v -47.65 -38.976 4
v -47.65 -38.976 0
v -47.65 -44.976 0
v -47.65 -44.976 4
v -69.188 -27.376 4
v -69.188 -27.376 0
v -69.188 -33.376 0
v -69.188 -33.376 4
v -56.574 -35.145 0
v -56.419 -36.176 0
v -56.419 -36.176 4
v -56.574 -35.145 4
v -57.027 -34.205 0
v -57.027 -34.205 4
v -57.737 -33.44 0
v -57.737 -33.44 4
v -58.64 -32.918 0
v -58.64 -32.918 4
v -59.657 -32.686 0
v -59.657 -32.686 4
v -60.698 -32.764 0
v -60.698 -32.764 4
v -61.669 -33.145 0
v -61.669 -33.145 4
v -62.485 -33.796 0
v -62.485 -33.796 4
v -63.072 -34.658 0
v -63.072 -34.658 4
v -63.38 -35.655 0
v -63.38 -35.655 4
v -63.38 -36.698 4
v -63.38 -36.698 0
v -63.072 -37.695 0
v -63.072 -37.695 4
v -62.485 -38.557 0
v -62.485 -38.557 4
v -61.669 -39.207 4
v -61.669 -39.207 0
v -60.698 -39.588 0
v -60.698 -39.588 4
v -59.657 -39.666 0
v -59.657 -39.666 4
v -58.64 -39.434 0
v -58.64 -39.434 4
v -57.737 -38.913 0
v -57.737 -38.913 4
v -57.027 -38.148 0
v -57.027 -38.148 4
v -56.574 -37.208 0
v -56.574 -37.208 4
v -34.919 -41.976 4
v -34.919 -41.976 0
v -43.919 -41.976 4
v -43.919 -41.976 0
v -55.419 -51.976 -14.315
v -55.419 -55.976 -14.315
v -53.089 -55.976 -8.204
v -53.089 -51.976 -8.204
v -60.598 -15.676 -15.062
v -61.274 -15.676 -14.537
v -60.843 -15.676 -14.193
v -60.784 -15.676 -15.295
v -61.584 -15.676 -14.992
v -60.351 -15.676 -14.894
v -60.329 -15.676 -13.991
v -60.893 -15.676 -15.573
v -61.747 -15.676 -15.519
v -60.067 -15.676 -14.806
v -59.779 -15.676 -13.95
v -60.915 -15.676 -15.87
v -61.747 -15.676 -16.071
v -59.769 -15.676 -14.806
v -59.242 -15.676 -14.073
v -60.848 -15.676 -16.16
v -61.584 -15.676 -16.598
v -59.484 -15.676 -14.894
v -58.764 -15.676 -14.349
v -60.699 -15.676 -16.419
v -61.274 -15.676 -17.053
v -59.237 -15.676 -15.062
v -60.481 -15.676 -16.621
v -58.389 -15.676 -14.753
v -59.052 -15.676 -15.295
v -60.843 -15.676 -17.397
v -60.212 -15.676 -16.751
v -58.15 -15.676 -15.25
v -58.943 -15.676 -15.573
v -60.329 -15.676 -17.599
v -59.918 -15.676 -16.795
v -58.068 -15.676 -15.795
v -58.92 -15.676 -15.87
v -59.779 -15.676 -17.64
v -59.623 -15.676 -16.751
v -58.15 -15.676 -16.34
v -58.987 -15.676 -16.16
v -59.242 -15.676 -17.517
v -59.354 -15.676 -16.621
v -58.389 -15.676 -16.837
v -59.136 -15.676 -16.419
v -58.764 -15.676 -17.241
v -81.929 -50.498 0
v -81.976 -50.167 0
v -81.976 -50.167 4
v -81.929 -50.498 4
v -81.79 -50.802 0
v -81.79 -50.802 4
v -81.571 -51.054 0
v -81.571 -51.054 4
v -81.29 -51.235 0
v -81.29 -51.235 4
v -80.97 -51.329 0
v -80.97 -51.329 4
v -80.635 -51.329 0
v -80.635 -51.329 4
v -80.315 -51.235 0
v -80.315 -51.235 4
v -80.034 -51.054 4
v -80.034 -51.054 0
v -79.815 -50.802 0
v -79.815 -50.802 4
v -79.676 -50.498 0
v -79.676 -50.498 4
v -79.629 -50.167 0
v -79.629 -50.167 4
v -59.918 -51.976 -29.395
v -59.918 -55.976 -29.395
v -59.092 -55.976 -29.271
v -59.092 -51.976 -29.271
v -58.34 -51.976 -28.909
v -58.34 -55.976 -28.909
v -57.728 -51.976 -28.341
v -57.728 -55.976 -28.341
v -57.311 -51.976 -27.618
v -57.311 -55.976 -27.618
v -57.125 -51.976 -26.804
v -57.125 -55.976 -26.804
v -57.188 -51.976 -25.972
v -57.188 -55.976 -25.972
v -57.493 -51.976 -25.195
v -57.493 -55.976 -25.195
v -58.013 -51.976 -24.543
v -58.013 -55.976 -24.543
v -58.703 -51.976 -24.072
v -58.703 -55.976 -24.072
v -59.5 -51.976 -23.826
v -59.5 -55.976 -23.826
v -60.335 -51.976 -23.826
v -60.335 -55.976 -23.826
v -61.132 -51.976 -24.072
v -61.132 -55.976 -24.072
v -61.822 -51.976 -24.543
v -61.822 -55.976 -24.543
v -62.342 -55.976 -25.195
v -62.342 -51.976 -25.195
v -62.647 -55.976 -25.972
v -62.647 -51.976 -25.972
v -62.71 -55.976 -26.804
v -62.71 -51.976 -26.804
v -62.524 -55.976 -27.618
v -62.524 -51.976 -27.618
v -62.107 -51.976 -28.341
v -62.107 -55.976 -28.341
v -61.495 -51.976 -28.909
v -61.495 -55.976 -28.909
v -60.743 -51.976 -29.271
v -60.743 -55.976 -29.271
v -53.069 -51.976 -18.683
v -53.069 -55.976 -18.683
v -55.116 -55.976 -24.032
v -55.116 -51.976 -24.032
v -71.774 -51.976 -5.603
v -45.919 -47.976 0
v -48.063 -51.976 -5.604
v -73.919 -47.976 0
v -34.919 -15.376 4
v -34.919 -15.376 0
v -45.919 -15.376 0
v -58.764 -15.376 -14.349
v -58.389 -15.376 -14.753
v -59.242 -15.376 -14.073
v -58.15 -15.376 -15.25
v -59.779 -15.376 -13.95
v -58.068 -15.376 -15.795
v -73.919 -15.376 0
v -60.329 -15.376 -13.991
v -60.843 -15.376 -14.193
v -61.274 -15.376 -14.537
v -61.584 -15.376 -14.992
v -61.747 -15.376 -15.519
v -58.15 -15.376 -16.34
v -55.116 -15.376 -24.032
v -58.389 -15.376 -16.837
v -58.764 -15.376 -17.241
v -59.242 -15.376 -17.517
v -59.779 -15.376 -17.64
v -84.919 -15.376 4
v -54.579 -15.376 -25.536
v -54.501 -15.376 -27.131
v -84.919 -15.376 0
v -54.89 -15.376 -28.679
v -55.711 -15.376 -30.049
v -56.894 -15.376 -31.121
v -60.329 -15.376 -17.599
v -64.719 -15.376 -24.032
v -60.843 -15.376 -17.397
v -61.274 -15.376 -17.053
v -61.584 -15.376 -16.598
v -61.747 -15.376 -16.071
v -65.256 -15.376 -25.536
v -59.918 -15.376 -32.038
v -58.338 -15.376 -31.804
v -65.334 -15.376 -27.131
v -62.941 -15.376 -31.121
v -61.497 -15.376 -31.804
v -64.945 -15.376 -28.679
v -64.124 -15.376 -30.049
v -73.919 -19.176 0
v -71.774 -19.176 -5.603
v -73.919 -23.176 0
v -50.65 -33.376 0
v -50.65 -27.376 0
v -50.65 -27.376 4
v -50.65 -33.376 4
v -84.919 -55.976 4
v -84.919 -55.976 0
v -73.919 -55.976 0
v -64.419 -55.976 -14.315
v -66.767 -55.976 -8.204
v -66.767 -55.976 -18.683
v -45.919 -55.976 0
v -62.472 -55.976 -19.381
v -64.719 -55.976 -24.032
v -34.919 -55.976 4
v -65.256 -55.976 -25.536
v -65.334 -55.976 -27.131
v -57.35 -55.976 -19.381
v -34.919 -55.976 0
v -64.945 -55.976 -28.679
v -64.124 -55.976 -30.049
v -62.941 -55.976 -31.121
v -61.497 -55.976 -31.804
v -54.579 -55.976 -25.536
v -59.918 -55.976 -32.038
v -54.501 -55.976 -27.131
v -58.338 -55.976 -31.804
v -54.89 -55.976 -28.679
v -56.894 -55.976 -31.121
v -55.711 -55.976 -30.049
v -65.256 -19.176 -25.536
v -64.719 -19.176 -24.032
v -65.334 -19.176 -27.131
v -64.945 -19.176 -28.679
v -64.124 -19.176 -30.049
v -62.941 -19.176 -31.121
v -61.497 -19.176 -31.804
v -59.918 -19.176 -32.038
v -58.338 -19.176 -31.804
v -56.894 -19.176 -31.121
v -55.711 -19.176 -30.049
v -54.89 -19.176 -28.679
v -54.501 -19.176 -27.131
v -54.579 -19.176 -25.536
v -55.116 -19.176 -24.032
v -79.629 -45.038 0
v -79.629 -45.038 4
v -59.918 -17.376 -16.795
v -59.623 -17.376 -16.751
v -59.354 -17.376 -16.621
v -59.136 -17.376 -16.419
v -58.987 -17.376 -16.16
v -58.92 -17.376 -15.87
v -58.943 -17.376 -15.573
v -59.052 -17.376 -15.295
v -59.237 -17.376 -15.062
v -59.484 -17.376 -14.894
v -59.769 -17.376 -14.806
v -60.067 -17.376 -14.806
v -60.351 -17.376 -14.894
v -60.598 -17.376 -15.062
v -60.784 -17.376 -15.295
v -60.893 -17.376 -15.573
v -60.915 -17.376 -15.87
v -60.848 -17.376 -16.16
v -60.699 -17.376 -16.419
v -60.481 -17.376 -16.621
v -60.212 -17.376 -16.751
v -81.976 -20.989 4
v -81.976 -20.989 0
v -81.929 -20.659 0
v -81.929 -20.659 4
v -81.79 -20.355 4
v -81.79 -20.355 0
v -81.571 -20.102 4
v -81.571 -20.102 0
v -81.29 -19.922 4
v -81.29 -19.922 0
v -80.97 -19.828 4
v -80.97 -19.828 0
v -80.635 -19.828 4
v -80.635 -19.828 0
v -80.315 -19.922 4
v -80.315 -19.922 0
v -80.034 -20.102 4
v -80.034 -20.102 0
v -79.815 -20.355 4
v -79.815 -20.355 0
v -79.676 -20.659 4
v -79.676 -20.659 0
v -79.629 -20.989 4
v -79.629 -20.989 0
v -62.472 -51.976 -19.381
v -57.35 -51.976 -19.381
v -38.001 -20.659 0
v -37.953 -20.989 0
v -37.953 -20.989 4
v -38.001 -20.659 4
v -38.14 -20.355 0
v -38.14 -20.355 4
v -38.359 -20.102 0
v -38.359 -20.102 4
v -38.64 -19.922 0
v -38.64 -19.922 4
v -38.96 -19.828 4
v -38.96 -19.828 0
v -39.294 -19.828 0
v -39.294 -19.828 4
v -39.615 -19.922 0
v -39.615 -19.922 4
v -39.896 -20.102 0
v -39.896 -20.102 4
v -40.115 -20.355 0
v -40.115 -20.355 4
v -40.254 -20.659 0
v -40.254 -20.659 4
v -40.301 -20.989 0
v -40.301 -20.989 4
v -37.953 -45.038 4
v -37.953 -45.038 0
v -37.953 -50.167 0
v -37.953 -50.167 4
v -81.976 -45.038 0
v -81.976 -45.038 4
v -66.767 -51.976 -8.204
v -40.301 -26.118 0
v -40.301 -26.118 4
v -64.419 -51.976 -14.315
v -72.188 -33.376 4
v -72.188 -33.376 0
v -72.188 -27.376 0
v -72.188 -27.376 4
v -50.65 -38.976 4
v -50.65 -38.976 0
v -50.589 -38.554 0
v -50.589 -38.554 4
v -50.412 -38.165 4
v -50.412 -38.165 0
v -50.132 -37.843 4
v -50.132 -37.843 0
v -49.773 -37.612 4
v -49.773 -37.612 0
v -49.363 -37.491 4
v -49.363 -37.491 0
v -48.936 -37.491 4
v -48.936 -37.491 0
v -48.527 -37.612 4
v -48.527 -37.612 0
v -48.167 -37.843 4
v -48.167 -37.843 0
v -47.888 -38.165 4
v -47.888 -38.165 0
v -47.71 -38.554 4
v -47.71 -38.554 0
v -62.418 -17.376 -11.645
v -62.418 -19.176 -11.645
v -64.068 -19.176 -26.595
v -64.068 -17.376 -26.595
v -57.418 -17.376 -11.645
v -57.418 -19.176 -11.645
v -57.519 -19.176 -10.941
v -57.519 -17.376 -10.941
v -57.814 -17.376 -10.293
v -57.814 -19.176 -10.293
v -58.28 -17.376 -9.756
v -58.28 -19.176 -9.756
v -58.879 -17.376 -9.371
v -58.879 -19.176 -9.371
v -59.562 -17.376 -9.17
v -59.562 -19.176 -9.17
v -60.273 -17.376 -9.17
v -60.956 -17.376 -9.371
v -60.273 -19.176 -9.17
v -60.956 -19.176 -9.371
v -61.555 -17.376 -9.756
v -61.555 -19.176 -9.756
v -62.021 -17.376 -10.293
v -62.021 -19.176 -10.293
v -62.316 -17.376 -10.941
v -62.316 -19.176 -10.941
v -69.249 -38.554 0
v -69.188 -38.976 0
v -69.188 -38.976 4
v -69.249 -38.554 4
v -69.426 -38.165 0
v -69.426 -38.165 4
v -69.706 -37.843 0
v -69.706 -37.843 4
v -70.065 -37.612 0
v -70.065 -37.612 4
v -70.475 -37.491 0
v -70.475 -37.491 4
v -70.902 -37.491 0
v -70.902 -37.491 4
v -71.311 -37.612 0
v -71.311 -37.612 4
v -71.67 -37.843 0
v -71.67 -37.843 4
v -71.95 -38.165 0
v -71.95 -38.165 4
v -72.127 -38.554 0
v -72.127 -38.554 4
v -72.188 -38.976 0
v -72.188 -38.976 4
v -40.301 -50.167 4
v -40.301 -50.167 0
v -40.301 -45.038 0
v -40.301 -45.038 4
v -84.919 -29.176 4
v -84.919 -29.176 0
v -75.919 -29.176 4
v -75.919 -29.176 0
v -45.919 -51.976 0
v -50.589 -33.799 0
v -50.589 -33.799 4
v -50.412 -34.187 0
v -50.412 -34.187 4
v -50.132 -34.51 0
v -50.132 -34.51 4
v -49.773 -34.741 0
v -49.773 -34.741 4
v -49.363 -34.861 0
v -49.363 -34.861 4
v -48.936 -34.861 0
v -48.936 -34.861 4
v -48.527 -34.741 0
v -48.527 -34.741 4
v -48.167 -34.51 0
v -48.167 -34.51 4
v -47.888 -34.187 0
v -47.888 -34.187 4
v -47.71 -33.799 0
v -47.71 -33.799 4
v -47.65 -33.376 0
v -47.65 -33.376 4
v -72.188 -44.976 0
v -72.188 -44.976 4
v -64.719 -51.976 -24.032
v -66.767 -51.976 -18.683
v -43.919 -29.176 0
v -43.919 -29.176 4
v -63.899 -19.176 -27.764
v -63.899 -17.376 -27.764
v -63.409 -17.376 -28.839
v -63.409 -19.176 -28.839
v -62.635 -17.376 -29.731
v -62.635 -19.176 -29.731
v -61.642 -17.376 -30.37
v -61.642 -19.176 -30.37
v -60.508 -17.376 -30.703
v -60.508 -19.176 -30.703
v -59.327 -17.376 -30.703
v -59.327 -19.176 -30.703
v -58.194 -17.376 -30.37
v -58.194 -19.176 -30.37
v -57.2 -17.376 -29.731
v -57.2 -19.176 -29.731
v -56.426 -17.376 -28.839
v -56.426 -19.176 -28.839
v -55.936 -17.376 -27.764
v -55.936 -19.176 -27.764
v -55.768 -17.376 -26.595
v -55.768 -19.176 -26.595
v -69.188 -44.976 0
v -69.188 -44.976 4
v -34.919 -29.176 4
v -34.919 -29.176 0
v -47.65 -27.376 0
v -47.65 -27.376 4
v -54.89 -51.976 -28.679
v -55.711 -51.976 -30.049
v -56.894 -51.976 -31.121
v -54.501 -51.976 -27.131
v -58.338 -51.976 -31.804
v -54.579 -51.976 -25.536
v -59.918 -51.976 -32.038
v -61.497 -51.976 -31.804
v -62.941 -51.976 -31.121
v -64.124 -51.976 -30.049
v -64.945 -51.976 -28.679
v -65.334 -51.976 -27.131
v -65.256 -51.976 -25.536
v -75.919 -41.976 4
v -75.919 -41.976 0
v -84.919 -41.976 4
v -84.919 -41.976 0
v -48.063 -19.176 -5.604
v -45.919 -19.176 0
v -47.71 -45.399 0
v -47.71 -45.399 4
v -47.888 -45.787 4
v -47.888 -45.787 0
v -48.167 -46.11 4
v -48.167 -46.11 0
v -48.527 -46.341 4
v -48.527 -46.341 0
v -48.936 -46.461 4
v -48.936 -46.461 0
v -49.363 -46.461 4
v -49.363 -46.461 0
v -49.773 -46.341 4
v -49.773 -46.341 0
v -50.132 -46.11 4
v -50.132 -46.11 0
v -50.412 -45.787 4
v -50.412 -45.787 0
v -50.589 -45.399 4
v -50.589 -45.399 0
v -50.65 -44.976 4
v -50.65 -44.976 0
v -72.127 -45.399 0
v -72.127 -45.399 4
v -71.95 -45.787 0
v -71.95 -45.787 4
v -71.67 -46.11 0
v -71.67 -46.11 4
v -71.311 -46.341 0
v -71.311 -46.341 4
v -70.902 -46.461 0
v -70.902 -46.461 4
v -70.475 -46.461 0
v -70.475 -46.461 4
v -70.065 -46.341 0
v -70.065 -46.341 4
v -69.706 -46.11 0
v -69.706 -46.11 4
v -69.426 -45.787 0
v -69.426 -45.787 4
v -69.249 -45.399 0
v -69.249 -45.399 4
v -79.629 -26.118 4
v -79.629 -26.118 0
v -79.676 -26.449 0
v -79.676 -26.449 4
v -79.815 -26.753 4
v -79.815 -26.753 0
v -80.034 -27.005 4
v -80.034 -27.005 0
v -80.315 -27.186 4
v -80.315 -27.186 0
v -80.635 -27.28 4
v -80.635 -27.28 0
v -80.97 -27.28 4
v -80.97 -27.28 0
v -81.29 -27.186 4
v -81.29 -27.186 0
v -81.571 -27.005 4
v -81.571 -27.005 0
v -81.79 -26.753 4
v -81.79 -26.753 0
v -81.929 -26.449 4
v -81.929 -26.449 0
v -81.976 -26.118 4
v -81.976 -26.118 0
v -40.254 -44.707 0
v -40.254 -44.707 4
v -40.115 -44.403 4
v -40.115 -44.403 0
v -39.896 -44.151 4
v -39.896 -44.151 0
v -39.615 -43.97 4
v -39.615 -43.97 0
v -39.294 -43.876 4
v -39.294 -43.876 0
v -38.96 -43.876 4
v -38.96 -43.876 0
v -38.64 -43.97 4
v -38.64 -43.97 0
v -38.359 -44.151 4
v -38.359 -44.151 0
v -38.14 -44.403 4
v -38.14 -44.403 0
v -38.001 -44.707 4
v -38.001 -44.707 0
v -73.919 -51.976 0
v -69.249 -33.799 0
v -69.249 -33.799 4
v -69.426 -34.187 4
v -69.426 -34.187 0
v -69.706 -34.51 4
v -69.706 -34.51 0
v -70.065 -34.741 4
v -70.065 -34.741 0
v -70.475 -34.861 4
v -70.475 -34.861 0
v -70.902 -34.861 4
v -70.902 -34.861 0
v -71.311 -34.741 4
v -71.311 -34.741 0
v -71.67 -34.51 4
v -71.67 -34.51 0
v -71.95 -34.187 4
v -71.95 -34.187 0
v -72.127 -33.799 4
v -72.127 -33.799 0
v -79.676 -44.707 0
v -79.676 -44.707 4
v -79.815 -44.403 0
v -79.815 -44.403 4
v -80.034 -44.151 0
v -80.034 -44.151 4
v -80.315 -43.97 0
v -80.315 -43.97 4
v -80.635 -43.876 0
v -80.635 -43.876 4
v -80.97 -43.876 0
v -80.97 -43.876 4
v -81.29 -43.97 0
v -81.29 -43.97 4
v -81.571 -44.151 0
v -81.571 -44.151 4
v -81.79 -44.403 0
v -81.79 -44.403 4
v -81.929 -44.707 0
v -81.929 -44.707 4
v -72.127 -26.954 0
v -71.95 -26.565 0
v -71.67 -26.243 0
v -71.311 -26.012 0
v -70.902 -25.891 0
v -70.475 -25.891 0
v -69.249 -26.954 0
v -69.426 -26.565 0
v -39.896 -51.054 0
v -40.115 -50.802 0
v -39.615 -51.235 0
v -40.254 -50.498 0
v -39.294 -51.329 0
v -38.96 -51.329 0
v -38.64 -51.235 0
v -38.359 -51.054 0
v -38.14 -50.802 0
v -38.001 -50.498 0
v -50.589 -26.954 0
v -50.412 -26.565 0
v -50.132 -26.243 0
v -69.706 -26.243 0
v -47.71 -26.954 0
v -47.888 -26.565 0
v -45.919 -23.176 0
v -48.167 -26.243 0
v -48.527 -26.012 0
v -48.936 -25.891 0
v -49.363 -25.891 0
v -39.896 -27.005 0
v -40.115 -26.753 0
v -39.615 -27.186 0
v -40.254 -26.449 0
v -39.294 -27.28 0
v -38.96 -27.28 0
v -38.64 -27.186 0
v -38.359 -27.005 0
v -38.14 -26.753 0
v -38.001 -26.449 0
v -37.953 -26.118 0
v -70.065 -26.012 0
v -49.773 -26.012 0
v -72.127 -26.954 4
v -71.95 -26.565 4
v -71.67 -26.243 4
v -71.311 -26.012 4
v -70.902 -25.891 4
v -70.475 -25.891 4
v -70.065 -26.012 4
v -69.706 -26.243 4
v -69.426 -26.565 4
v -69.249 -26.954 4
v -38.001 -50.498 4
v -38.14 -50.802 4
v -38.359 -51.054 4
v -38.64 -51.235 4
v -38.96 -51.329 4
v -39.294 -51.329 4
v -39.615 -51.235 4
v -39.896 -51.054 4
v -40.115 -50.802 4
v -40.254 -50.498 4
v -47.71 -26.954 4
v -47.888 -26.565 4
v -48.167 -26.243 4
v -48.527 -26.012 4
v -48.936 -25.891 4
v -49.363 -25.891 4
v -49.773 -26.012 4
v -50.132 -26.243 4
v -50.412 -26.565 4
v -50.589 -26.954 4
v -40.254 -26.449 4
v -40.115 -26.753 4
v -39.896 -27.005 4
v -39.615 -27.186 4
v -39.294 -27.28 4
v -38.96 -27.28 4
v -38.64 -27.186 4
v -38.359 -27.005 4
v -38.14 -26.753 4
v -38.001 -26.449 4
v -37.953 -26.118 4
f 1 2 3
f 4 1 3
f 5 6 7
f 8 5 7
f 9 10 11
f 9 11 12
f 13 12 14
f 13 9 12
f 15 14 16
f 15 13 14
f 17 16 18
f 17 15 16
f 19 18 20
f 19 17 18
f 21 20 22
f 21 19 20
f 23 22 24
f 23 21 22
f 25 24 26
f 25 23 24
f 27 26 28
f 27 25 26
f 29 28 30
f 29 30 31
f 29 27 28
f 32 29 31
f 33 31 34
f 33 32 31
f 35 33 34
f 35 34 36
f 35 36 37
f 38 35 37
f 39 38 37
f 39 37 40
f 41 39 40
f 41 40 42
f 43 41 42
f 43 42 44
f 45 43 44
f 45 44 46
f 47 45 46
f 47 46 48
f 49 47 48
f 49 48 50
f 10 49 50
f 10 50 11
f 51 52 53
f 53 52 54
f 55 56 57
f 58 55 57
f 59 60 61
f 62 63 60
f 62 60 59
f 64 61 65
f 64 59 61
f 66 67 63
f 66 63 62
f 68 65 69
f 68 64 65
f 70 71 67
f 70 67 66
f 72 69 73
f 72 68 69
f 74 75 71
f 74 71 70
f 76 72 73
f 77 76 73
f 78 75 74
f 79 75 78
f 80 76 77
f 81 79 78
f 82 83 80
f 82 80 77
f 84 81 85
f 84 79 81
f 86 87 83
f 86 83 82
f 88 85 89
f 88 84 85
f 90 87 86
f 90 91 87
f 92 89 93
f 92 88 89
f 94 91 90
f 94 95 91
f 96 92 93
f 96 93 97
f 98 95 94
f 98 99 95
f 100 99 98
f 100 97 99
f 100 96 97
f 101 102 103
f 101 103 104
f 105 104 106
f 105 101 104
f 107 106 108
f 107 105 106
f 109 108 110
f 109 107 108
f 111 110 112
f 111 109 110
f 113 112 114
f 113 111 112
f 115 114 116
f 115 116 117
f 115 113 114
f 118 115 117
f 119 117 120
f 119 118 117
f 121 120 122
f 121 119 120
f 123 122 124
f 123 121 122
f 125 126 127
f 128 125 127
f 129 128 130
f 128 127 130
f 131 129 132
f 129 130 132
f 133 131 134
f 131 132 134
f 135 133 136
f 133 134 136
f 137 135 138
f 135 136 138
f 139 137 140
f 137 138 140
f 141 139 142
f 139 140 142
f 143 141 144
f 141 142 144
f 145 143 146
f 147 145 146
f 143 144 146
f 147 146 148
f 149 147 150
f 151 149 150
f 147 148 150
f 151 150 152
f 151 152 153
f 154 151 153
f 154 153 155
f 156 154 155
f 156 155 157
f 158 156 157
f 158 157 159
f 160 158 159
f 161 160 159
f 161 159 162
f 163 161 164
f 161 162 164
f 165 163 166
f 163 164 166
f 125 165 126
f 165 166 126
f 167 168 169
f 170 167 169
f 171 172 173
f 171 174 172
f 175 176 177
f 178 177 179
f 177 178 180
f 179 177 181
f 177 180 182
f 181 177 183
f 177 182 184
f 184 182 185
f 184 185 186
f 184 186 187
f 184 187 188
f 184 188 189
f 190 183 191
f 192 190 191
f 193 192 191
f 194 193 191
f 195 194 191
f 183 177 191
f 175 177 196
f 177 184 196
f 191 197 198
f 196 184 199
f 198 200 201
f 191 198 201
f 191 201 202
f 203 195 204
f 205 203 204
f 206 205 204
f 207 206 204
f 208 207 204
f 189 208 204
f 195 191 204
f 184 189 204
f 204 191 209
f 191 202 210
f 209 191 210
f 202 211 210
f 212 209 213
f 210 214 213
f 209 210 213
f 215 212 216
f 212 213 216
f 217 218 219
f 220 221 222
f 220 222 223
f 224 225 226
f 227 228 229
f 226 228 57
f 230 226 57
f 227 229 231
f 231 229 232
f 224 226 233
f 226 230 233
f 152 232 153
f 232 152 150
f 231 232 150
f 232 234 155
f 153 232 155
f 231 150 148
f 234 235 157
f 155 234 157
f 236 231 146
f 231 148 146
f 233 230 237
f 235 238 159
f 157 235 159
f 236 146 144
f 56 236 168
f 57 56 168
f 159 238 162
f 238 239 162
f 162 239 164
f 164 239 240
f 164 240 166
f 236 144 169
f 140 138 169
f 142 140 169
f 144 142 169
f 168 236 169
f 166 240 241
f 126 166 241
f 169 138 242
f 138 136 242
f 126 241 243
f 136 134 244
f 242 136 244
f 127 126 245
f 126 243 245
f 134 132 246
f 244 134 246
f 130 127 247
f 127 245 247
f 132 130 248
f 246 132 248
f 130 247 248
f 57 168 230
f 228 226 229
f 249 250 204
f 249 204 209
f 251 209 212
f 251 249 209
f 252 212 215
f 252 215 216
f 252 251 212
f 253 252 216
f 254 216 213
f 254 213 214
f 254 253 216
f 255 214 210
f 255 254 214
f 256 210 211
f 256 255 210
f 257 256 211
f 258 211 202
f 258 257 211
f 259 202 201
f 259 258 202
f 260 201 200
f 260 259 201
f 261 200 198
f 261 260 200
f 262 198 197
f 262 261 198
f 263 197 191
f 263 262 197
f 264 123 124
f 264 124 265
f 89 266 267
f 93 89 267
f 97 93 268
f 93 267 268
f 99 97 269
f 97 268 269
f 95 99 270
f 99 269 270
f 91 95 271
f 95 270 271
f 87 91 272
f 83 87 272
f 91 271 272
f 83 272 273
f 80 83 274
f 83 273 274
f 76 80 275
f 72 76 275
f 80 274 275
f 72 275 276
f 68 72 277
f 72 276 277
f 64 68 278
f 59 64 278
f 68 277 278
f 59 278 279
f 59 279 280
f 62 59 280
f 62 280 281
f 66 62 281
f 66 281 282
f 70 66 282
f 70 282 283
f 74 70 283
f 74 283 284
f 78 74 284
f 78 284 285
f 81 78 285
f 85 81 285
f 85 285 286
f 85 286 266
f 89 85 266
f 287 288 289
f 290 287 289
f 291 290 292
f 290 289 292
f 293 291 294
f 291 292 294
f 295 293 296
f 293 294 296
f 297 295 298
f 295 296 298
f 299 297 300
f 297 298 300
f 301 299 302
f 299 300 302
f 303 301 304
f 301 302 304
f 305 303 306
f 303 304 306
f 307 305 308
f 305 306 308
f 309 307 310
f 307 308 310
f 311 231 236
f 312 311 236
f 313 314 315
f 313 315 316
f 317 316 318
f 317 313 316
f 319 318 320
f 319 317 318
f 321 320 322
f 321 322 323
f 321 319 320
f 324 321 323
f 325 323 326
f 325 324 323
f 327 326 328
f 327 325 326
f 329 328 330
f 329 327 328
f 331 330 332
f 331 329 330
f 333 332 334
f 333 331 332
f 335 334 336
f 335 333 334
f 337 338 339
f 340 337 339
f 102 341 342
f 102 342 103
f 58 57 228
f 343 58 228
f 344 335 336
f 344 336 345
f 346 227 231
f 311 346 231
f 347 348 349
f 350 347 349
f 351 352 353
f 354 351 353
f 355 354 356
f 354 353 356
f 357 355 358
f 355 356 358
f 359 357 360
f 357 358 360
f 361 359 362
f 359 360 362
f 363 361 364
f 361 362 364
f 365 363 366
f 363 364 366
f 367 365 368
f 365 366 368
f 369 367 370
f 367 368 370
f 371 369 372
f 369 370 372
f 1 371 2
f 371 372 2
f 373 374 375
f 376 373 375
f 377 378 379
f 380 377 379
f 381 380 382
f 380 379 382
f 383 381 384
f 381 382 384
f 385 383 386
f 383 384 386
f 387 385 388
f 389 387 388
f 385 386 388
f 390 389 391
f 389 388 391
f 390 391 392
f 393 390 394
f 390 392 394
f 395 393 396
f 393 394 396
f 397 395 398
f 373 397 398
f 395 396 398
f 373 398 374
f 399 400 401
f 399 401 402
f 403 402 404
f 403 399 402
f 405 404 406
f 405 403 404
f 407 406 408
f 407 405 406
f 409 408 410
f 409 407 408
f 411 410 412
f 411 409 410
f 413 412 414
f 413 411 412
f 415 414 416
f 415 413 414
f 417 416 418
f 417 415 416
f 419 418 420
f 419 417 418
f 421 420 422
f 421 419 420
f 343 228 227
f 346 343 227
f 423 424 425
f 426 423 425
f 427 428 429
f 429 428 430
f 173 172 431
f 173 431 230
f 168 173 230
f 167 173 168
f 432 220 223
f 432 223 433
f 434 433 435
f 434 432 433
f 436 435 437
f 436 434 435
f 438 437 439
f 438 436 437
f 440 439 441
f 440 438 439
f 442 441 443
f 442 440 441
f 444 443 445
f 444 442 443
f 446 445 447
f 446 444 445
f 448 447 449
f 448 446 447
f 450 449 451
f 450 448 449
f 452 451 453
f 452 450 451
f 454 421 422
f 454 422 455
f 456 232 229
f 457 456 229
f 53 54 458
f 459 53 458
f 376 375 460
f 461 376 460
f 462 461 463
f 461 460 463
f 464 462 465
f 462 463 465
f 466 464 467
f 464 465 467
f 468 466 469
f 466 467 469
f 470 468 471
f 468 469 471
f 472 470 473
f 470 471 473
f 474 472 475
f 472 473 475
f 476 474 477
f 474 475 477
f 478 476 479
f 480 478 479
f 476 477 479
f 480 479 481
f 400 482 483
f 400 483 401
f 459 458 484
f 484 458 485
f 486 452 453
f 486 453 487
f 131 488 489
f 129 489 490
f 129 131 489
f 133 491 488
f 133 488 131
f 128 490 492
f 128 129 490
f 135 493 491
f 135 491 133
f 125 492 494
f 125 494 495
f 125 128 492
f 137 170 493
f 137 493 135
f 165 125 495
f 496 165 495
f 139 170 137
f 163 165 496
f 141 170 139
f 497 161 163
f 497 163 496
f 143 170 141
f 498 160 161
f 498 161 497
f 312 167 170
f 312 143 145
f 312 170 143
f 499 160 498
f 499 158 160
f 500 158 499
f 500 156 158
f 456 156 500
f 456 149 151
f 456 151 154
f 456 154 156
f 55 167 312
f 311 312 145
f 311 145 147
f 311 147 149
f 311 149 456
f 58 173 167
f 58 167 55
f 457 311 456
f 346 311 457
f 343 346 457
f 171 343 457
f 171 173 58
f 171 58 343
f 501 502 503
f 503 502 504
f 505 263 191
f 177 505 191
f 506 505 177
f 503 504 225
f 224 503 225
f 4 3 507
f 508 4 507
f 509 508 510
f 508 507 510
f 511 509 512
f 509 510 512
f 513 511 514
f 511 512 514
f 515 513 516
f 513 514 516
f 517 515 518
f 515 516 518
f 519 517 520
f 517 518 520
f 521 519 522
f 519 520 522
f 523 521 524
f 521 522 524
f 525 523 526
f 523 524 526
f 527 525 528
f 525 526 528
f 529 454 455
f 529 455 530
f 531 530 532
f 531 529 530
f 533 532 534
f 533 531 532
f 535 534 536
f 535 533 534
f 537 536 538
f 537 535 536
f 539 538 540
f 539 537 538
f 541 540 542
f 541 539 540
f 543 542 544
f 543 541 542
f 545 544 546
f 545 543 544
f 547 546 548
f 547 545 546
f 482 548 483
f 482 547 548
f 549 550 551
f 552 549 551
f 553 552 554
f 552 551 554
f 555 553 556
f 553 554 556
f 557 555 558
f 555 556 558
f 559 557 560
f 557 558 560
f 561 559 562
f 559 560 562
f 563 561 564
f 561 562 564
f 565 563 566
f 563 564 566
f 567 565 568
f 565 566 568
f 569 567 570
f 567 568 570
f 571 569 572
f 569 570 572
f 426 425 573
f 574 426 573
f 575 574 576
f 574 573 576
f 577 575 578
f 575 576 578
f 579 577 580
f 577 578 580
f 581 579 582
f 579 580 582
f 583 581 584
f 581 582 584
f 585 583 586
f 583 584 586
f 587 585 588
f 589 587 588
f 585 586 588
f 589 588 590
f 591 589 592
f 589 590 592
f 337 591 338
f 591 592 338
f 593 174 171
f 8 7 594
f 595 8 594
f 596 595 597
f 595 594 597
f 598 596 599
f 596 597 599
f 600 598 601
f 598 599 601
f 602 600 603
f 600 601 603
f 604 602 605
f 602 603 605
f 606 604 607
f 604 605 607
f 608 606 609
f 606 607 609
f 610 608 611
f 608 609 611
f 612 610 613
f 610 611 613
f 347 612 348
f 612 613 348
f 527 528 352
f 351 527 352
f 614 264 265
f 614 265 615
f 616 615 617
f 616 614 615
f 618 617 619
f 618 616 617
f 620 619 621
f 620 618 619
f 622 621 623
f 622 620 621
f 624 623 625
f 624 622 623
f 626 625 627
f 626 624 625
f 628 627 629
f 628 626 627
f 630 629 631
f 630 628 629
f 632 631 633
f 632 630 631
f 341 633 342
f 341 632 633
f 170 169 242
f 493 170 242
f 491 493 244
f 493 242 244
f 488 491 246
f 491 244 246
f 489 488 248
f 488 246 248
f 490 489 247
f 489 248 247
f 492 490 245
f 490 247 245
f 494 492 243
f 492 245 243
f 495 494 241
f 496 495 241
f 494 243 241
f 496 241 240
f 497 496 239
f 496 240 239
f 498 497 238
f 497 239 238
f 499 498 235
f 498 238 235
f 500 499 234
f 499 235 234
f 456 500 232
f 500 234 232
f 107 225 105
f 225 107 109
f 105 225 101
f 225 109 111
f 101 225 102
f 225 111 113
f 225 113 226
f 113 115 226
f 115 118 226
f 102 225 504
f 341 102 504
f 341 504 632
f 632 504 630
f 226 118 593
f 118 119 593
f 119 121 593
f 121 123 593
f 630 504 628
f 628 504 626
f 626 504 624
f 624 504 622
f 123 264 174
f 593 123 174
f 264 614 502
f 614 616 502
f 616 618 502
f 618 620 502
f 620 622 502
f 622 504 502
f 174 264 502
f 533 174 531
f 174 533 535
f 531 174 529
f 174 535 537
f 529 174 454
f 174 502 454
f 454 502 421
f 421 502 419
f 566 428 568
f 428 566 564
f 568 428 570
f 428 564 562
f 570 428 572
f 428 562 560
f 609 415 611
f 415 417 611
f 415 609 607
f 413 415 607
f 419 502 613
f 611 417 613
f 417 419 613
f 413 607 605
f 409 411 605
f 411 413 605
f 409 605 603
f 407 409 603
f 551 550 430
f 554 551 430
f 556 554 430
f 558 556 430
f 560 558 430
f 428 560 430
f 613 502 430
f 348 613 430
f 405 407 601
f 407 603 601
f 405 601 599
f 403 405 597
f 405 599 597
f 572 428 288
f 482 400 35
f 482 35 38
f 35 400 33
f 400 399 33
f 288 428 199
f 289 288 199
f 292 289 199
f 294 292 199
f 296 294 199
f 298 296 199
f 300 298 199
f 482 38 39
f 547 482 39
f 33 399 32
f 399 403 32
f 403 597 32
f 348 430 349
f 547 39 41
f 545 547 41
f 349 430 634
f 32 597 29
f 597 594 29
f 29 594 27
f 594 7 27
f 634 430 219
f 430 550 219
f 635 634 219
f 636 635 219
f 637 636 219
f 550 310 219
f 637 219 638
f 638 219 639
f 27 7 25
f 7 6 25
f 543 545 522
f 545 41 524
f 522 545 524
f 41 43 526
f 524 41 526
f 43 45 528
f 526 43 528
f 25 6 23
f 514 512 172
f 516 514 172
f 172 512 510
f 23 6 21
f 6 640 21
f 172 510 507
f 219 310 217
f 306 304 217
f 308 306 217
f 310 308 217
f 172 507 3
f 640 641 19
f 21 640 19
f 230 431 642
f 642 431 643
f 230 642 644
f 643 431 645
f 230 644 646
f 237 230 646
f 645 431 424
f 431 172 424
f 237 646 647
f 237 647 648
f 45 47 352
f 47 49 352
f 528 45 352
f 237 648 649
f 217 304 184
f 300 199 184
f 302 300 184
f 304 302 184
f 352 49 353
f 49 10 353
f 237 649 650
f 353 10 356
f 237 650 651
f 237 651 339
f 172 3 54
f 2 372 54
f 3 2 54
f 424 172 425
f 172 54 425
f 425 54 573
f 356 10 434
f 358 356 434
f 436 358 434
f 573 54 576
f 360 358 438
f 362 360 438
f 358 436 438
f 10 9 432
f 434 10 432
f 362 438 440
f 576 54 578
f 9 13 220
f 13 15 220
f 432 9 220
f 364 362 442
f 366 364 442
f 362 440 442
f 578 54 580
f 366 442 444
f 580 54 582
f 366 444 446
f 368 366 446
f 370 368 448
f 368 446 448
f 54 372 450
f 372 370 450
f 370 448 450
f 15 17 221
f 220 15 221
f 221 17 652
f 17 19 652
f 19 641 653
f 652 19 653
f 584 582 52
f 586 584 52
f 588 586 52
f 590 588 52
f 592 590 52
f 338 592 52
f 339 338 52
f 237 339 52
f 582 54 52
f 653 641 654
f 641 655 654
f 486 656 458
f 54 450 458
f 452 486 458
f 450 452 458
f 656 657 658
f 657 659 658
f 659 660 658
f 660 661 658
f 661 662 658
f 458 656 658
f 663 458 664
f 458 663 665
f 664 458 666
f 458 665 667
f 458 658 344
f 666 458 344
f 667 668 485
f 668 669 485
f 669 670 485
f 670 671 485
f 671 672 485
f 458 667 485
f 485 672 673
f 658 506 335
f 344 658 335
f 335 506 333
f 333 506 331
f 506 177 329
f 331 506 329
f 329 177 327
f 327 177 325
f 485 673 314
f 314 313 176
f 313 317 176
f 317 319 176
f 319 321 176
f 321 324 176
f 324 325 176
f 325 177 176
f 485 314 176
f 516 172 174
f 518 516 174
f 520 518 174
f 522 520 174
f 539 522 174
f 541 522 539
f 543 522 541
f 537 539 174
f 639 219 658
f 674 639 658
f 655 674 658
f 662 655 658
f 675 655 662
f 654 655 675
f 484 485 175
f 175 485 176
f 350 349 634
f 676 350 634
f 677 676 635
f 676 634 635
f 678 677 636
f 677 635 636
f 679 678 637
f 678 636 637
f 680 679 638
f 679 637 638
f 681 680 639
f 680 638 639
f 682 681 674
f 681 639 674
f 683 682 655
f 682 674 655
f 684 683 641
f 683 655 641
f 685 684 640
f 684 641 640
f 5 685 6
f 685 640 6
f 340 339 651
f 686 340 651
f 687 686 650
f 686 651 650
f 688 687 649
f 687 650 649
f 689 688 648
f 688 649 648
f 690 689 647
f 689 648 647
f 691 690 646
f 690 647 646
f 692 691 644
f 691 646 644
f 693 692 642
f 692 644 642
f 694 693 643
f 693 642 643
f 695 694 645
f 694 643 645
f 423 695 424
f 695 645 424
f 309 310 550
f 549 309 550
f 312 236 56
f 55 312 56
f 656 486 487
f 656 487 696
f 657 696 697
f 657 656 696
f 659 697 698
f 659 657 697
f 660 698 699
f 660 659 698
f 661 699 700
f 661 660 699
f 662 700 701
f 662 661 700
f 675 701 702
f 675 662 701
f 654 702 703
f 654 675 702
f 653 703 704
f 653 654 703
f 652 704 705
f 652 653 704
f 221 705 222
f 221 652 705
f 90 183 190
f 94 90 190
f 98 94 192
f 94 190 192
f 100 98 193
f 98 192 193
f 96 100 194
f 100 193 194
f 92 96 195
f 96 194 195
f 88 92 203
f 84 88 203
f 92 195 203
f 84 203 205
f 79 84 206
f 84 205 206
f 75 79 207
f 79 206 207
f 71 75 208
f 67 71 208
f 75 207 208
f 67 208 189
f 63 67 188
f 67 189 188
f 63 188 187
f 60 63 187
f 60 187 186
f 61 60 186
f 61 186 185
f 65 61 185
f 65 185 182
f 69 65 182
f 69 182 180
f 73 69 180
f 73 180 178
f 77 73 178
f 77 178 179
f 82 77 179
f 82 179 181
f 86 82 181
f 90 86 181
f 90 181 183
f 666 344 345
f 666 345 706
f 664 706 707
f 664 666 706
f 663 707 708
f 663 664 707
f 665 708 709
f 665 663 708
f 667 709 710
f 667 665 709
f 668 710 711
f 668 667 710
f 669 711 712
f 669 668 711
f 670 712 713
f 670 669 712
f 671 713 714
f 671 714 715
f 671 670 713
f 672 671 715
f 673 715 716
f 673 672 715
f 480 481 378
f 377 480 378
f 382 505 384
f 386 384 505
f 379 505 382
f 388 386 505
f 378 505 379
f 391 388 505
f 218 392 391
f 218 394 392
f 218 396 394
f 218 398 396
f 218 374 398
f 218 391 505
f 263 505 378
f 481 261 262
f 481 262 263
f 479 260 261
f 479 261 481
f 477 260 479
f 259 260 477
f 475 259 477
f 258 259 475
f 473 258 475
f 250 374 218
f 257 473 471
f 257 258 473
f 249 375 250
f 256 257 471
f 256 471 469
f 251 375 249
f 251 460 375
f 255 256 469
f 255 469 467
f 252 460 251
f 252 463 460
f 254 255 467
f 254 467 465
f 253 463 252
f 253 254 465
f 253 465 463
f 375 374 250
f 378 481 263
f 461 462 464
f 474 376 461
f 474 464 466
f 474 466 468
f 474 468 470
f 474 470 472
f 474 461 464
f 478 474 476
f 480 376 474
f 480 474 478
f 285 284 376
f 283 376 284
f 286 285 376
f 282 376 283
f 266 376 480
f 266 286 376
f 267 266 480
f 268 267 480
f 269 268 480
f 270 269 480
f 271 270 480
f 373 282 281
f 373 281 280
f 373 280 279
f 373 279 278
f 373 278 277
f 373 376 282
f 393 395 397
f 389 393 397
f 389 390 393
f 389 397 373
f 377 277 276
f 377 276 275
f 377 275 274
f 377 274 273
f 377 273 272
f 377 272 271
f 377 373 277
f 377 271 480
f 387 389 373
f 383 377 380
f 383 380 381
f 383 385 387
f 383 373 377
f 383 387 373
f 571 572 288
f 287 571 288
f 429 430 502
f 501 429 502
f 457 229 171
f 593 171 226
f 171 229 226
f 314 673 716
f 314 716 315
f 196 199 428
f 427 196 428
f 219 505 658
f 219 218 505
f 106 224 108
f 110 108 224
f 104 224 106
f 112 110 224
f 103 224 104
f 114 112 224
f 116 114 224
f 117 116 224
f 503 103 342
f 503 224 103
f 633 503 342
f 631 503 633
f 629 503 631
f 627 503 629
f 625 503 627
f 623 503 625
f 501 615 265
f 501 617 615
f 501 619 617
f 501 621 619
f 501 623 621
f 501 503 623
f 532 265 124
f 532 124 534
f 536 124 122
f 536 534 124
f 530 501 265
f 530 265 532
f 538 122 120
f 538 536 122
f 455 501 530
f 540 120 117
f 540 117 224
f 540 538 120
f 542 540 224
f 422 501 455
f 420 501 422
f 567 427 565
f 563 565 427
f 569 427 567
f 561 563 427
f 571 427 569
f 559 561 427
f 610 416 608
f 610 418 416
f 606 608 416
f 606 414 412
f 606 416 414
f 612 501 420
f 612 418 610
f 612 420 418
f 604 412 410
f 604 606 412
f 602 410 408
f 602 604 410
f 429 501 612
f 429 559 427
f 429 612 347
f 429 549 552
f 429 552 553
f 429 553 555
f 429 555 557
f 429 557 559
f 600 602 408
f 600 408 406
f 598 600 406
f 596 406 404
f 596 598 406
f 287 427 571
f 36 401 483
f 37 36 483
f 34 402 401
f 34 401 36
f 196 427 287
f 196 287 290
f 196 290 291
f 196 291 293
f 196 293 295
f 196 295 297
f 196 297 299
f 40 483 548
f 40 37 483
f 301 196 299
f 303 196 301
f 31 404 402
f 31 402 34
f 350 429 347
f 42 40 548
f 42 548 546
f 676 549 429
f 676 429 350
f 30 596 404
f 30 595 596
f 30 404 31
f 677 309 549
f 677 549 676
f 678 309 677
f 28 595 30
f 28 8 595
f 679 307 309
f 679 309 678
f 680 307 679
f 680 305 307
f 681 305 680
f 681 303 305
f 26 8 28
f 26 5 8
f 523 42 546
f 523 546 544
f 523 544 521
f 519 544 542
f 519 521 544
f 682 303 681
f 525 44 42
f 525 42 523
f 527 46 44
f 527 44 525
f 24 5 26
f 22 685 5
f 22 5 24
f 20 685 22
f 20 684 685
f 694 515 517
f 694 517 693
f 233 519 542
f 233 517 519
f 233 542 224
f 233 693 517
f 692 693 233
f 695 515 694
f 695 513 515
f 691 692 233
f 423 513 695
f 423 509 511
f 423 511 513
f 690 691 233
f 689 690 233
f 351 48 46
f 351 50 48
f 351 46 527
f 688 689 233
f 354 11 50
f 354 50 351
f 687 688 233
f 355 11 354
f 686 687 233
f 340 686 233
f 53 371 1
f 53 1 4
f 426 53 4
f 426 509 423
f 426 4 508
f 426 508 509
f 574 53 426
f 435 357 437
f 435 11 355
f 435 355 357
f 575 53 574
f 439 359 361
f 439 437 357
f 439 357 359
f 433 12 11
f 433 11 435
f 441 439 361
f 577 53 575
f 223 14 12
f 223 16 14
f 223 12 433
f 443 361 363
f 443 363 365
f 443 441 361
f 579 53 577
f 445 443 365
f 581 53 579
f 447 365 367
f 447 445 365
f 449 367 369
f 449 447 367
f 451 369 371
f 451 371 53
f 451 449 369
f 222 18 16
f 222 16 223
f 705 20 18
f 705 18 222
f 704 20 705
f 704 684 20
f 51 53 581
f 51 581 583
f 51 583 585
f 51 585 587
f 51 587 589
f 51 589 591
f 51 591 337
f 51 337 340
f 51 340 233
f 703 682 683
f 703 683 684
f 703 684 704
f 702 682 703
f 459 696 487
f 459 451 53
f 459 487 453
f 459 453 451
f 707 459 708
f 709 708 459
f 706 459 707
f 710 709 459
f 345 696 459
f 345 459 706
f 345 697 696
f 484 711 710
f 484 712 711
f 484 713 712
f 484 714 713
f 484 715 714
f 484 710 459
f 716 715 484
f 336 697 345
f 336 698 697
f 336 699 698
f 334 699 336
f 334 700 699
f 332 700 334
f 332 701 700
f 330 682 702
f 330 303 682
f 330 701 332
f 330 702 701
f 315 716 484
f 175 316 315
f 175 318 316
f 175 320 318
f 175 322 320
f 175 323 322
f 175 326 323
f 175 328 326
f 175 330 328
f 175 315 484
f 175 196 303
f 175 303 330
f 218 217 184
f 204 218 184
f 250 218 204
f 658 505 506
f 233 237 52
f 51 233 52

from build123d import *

# Parameters (mm, degrees)
ESBO_O1_R                                           = 3.5
RESSALTO_EXTRUS_O3_DEPTH                            = 2
ESBO_O3_R                                           = 2.8
RESSALTO_EXTRUS_O4_DEPTH                            = 4
RESSALTO_EXTRUS_O6_START                            = -3.8
RESSALTO_EXTRUS_O6_DEPTH                            = 3.8
ESBO_O1_2_R                                         = 3.5
RESSALTO_EXTRUS_O7_DEPTH                            = 4
CORTE_EXTRUS_O1_DEPTH                               = 1.8
ESBO_O12_R                                          = 1
CORTE_EXTRUS_O2_DEPTH                               = 99.628595452
REBAIXO_PARA_PARAFUSO_COM_CABE_A_PANELA_D           = 2
REBAIXO_PARA_PARAFUSO_COM_CABE_A_PANELA_CBORE_D     = 3.7
REBAIXO_PARA_PARAFUSO_COM_CABE_A_PANELA_CBORE_DEPTH = 0.3


with BuildPart() as part:
    # Esboço1 → Ressalto-extrusão3 (new body)
    with BuildSketch(Plane.XY):
        Polygon((-84.918900929, -29.176229512), (-75.918900929, -29.176229512), (-75.918900929, -41.976229512), (-84.918900929, -41.976229512), (-84.918900929, -55.976229512), (-34.918900929, -55.976229512), (-34.918900929, -41.976229512), (-43.918900929, -41.976229512), (-43.918900929, -29.176229512), (-34.918900929, -29.176229512), (-34.918900929, -15.376229512), (-84.918900929, -15.376229512), align=None)
        with Locations((-59.918900929, -36.176229512)):
            Circle(ESBO_O1_R, mode=Mode.SUBTRACT)
        with BuildLine():
            Line((-79.628633502, -20.989452457), (-79.628633502, -26.118287824))
            ThreePointArc((-79.628633502, -26.118287824), (-80.802509211, -27.292163532), (-81.97638492, -26.118287824))
            Line((-81.97638492, -26.118287824), (-81.97638492, -20.989452457))
            ThreePointArc((-81.97638492, -20.989452457), (-80.802509211, -19.815576748), (-79.628633502, -20.989452457))
        make_face(mode=Mode.SUBTRACT)
        with BuildLine():
            Line((-69.188165399, -27.376229512), (-69.188165399, -33.376229512))
            ThreePointArc((-69.188165399, -33.376229512), (-70.688165399, -34.876229512), (-72.188165399, -33.376229512))
            Line((-72.188165399, -33.376229512), (-72.188165399, -27.376229512))
            ThreePointArc((-72.188165399, -27.376229512), (-70.688165399, -25.876229512), (-69.188165399, -27.376229512))
        make_face(mode=Mode.SUBTRACT)
        with BuildLine():
            Line((-79.628633502, -50.166860599), (-79.628633502, -45.038025232))
            ThreePointArc((-79.628633502, -45.038025232), (-80.802509211, -43.864149523), (-81.97638492, -45.038025232))
            Line((-81.97638492, -45.038025232), (-81.97638492, -50.166860599))
            ThreePointArc((-81.97638492, -50.166860599), (-80.802509211, -51.340736308), (-79.628633502, -50.166860599))
        make_face(mode=Mode.SUBTRACT)
        with BuildLine():
            Line((-40.301250748, -20.989452457), (-40.301250748, -26.118287824))
            ThreePointArc((-40.301250748, -26.118287824), (-39.12737504, -27.292163532), (-37.953499331, -26.118287824))
            Line((-37.953499331, -26.118287824), (-37.953499331, -20.989452457))
            ThreePointArc((-37.953499331, -20.989452457), (-39.12737504, -19.815576748), (-40.301250748, -20.989452457))
        make_face(mode=Mode.SUBTRACT)
        with BuildLine():
            Line((-40.301250748, -50.166860599), (-40.301250748, -45.038025232))
            ThreePointArc((-40.301250748, -45.038025232), (-39.12737504, -43.864149523), (-37.953499331, -45.038025232))
            Line((-37.953499331, -45.038025232), (-37.953499331, -50.166860599))
            ThreePointArc((-37.953499331, -50.166860599), (-39.12737504, -51.340736308), (-40.301250748, -50.166860599))
        make_face(mode=Mode.SUBTRACT)
        with BuildLine():
            Line((-69.188165399, -44.976229512), (-69.188165399, -38.976229512))
            ThreePointArc((-69.188165399, -38.976229512), (-70.688165399, -37.476229512), (-72.188165399, -38.976229512))
            Line((-72.188165399, -38.976229512), (-72.188165399, -44.976229512))
            ThreePointArc((-72.188165399, -44.976229512), (-70.688165399, -46.476229512), (-69.188165399, -44.976229512))
        make_face(mode=Mode.SUBTRACT)
        with BuildLine():
            Line((-50.649636459, -44.976229512), (-50.649636459, -38.976229512))
            ThreePointArc((-50.649636459, -38.976229512), (-49.149636459, -37.476229512), (-47.649636459, -38.976229512))
            Line((-47.649636459, -38.976229512), (-47.649636459, -44.976229512))
            ThreePointArc((-47.649636459, -44.976229512), (-49.149636459, -46.476229512), (-50.649636459, -44.976229512))
        make_face(mode=Mode.SUBTRACT)
        with BuildLine():
            Line((-50.649636459, -27.376229512), (-50.649636459, -33.376229512))
            ThreePointArc((-50.649636459, -33.376229512), (-49.149636459, -34.876229512), (-47.649636459, -33.376229512))
            Line((-47.649636459, -33.376229512), (-47.649636459, -27.376229512))
            ThreePointArc((-47.649636459, -27.376229512), (-49.149636459, -25.876229512), (-50.649636459, -27.376229512))
        make_face(mode=Mode.SUBTRACT)
    extrude(amount=RESSALTO_EXTRUS_O3_DEPTH)

    # Esboço3 → Ressalto-extrusão4 (add)
    with BuildSketch(Plane.XZ.offset(55.976229512)):
        with BuildLine():
            Line((-69.918900929, 0), (-49.918900929, 0))
            Line((-49.918900929, 0), (-45.918900929, 0))
            Line((-45.918900929, 0), (-53.068900929, -18.682538503))
            Line((-53.068900929, -18.682538503), (-55.116153158, -24.031890755))
            ThreePointArc((-55.116153158, -24.031890755), (-59.917574185, -32.037791837), (-64.718995211, -24.031890755))
            Line((-64.718995211, -24.031890755), (-66.76683809, -18.682538503))
            Line((-66.76683809, -18.682538503), (-73.918900929, 0))
            Line((-73.918900929, 0), (-69.918900929, 0))
        make_face()
        with Locations((-59.917574185, -26.595050595)):
            Circle(ESBO_O3_R, mode=Mode.SUBTRACT)
        Polygon((-66.76683809, -8.203857571), (-64.418900929, -14.314821419), (-62.472202165, -19.381484176), (-57.350495612, -19.381484176), (-55.418900929, -14.314821419), (-53.089180985, -8.203857571), align=None, mode=Mode.SUBTRACT)
    extrude(amount=-RESSALTO_EXTRUS_O4_DEPTH)

    # Esboço4 → Ressalto-extrusão6 (add)
    with BuildSketch(Plane(origin=(0, -15.376229512, 0), x_dir=(1, 0, 0), z_dir=(0, 1, 0)).offset(RESSALTO_EXTRUS_O6_START)):
        with BuildLine():
            Line((-73.918900929, 0), (-64.718995211, 24.031890755))
            ThreePointArc((-64.718995211, 24.031890755), (-59.917574185, 32.037791837), (-55.116153158, 24.031890755))
            Line((-55.116153158, 24.031890755), (-45.918900929, 0))
            Line((-45.918900929, 0), (-49.918900929, 0))
            Line((-49.918900929, 0), (-69.918900929, 0))
            Line((-69.918900929, 0), (-73.918900929, 0))
        make_face()
    extrude(amount=RESSALTO_EXTRUS_O6_DEPTH)

    # Esboço1<2> → Ressalto-extrusão7 (add)
    with BuildSketch(Plane.XY):
        Polygon((-84.918900929, -29.176229512), (-75.918900929, -29.176229512), (-75.918900929, -41.976229512), (-84.918900929, -41.976229512), (-84.918900929, -55.976229512), (-34.918900929, -55.976229512), (-34.918900929, -41.976229512), (-43.918900929, -41.976229512), (-43.918900929, -29.176229512), (-34.918900929, -29.176229512), (-34.918900929, -15.376229512), (-84.918900929, -15.376229512), align=None)
        with Locations((-59.918900929, -36.176229512)):
            Circle(ESBO_O1_2_R, mode=Mode.SUBTRACT)
        with BuildLine():
            Line((-79.628633502, -20.989452457), (-79.628633502, -26.118287824))
            ThreePointArc((-79.628633502, -26.118287824), (-80.802509211, -27.292163532), (-81.97638492, -26.118287824))
            Line((-81.97638492, -26.118287824), (-81.97638492, -20.989452457))
            ThreePointArc((-81.97638492, -20.989452457), (-80.802509211, -19.815576748), (-79.628633502, -20.989452457))
        make_face(mode=Mode.SUBTRACT)
        with BuildLine():
            Line((-69.188165399, -27.376229512), (-69.188165399, -33.376229512))
            ThreePointArc((-69.188165399, -33.376229512), (-70.688165399, -34.876229512), (-72.188165399, -33.376229512))
            Line((-72.188165399, -33.376229512), (-72.188165399, -27.376229512))
            ThreePointArc((-72.188165399, -27.376229512), (-70.688165399, -25.876229512), (-69.188165399, -27.376229512))
        make_face(mode=Mode.SUBTRACT)
        with BuildLine():
            Line((-79.628633502, -50.166860599), (-79.628633502, -45.038025232))
            ThreePointArc((-79.628633502, -45.038025232), (-80.802509211, -43.864149523), (-81.97638492, -45.038025232))
            Line((-81.97638492, -45.038025232), (-81.97638492, -50.166860599))
            ThreePointArc((-81.97638492, -50.166860599), (-80.802509211, -51.340736308), (-79.628633502, -50.166860599))
        make_face(mode=Mode.SUBTRACT)
        with BuildLine():
            Line((-40.301250748, -20.989452457), (-40.301250748, -26.118287824))
            ThreePointArc((-40.301250748, -26.118287824), (-39.12737504, -27.292163532), (-37.953499331, -26.118287824))
            Line((-37.953499331, -26.118287824), (-37.953499331, -20.989452457))
            ThreePointArc((-37.953499331, -20.989452457), (-39.12737504, -19.815576748), (-40.301250748, -20.989452457))
        make_face(mode=Mode.SUBTRACT)
        with BuildLine():
            Line((-40.301250748, -50.166860599), (-40.301250748, -45.038025232))
            ThreePointArc((-40.301250748, -45.038025232), (-39.12737504, -43.864149523), (-37.953499331, -45.038025232))
            Line((-37.953499331, -45.038025232), (-37.953499331, -50.166860599))
            ThreePointArc((-37.953499331, -50.166860599), (-39.12737504, -51.340736308), (-40.301250748, -50.166860599))
        make_face(mode=Mode.SUBTRACT)
        with BuildLine():
            Line((-69.188165399, -44.976229512), (-69.188165399, -38.976229512))
            ThreePointArc((-69.188165399, -38.976229512), (-70.688165399, -37.476229512), (-72.188165399, -38.976229512))
            Line((-72.188165399, -38.976229512), (-72.188165399, -44.976229512))
            ThreePointArc((-72.188165399, -44.976229512), (-70.688165399, -46.476229512), (-69.188165399, -44.976229512))
        make_face(mode=Mode.SUBTRACT)
        with BuildLine():
            Line((-50.649636459, -44.976229512), (-50.649636459, -38.976229512))
            ThreePointArc((-50.649636459, -38.976229512), (-49.149636459, -37.476229512), (-47.649636459, -38.976229512))
            Line((-47.649636459, -38.976229512), (-47.649636459, -44.976229512))
            ThreePointArc((-47.649636459, -44.976229512), (-49.149636459, -46.476229512), (-50.649636459, -44.976229512))
        make_face(mode=Mode.SUBTRACT)
        with BuildLine():
            Line((-50.649636459, -27.376229512), (-50.649636459, -33.376229512))
            ThreePointArc((-50.649636459, -33.376229512), (-49.149636459, -34.876229512), (-47.649636459, -33.376229512))
            Line((-47.649636459, -33.376229512), (-47.649636459, -27.376229512))
            ThreePointArc((-47.649636459, -27.376229512), (-49.149636459, -25.876229512), (-50.649636459, -27.376229512))
        make_face(mode=Mode.SUBTRACT)
    extrude(amount=RESSALTO_EXTRUS_O7_DEPTH)

    # Esboço5 → Corte-extrusão1 (cut)
    with BuildSketch(Plane.XZ.offset(19.176229512)):
        with BuildLine():
            Line((-62.417574185, -11.645050595), (-64.067574185, -26.595050595))
            ThreePointArc((-64.067574185, -26.595050595), (-59.917574185, -30.745050595), (-55.767574185, -26.595050595))
            Line((-55.767574185, -26.595050595), (-57.417574185, -11.645050595))
            ThreePointArc((-57.417574185, -11.645050595), (-59.917574185, -9.145050595), (-62.417574185, -11.645050595))
        make_face()
    extrude(amount=-CORTE_EXTRUS_O1_DEPTH, mode=Mode.SUBTRACT)

    # Esboço12 → Corte-extrusão2 (cut, through all)
    with BuildSketch(Plane.XZ.offset(17.376229512)):
        with Locations((-59.917574185, -15.795050595)):
            Circle(ESBO_O12_R)
    extrude(amount=-CORTE_EXTRUS_O2_DEPTH, mode=Mode.SUBTRACT)

    # Rebaixo para parafuso com cabeça panela de M1.62 (through all)
    with Locations(Plane(origin=(0, -15.376229512, 0), x_dir=(1, 0, 0), z_dir=(0, 1, 0))):
        with Locations((-59.917574185, 15.795050595)):
            CounterBoreHole(REBAIXO_PARA_PARAFUSO_COM_CABE_A_PANELA_D / 2, REBAIXO_PARA_PARAFUSO_COM_CABE_A_PANELA_CBORE_D / 2, REBAIXO_PARA_PARAFUSO_COM_CABE_A_PANELA_CBORE_DEPTH)

    # Esboço19 → Loft1 section 0
    with BuildSketch(Plane(origin=(-40.052521208, 0, 15.328512589), x_dir=(-0.35742863536508446, 0, -0.9339404534664153), z_dir=(0.9339404534664153, 0, -0.35742863536508446))):
        with BuildLine():
            Line((22.412730097, -19.176229512), (16.412730097, -23.176229512))
            Line((16.412730097, -23.176229512), (16.412730097, -19.176229512))
            Line((16.412730097, -19.176229512), (22.412730097, -19.176229512))
        make_face()
    # Esboço21 → Loft1 section 1
    with BuildSketch(Plane(origin=(-64.470621516, 0, -24.68068974), x_dir=(-0.35751857745188526, 0, 0.9339060267375837), z_dir=(-0.9339060267375838, 0, -0.35751857745188526))):
        with BuildLine():
            Line((20.427380307, -19.176229512), (26.427380307, -23.176229512))
            Line((26.427380307, -23.176229512), (26.427380307, -19.176229512))
            Line((26.427380307, -19.176229512), (20.427380307, -19.176229512))
        make_face()
    loft()

    # Esboço25 → Loft2 section 0
    with BuildSketch(Plane(origin=(-40.052521208, 0, 15.328512589), x_dir=(-0.3574286353650846, 0, -0.9339404534664153), z_dir=(0.9339404534664153, 0, -0.3574286353650846))):
        with BuildLine():
            Line((16.412730097, -51.976229512), (16.412730097, -47.976229512))
            Line((16.412730097, -47.976229512), (22.412730097, -51.976229512))
            Line((22.412730097, -51.976229512), (16.412730097, -51.976229512))
        make_face()
    # Esboço24 → Loft2 section 1
    with BuildSketch(Plane(origin=(-64.470621516, 0, -24.68068974), x_dir=(-0.3575185774518854, 0, 0.9339060267375836), z_dir=(-0.9339060267375836, 0, -0.3575185774518854))):
        with BuildLine():
            Line((26.427380307, -51.976229512), (26.427380307, -47.976229512))
            Line((26.427380307, -47.976229512), (20.427380307, -51.976229512))
            Line((20.427380307, -51.976229512), (26.427380307, -51.976229512))
        make_face()
    loft()


solid = part.part
